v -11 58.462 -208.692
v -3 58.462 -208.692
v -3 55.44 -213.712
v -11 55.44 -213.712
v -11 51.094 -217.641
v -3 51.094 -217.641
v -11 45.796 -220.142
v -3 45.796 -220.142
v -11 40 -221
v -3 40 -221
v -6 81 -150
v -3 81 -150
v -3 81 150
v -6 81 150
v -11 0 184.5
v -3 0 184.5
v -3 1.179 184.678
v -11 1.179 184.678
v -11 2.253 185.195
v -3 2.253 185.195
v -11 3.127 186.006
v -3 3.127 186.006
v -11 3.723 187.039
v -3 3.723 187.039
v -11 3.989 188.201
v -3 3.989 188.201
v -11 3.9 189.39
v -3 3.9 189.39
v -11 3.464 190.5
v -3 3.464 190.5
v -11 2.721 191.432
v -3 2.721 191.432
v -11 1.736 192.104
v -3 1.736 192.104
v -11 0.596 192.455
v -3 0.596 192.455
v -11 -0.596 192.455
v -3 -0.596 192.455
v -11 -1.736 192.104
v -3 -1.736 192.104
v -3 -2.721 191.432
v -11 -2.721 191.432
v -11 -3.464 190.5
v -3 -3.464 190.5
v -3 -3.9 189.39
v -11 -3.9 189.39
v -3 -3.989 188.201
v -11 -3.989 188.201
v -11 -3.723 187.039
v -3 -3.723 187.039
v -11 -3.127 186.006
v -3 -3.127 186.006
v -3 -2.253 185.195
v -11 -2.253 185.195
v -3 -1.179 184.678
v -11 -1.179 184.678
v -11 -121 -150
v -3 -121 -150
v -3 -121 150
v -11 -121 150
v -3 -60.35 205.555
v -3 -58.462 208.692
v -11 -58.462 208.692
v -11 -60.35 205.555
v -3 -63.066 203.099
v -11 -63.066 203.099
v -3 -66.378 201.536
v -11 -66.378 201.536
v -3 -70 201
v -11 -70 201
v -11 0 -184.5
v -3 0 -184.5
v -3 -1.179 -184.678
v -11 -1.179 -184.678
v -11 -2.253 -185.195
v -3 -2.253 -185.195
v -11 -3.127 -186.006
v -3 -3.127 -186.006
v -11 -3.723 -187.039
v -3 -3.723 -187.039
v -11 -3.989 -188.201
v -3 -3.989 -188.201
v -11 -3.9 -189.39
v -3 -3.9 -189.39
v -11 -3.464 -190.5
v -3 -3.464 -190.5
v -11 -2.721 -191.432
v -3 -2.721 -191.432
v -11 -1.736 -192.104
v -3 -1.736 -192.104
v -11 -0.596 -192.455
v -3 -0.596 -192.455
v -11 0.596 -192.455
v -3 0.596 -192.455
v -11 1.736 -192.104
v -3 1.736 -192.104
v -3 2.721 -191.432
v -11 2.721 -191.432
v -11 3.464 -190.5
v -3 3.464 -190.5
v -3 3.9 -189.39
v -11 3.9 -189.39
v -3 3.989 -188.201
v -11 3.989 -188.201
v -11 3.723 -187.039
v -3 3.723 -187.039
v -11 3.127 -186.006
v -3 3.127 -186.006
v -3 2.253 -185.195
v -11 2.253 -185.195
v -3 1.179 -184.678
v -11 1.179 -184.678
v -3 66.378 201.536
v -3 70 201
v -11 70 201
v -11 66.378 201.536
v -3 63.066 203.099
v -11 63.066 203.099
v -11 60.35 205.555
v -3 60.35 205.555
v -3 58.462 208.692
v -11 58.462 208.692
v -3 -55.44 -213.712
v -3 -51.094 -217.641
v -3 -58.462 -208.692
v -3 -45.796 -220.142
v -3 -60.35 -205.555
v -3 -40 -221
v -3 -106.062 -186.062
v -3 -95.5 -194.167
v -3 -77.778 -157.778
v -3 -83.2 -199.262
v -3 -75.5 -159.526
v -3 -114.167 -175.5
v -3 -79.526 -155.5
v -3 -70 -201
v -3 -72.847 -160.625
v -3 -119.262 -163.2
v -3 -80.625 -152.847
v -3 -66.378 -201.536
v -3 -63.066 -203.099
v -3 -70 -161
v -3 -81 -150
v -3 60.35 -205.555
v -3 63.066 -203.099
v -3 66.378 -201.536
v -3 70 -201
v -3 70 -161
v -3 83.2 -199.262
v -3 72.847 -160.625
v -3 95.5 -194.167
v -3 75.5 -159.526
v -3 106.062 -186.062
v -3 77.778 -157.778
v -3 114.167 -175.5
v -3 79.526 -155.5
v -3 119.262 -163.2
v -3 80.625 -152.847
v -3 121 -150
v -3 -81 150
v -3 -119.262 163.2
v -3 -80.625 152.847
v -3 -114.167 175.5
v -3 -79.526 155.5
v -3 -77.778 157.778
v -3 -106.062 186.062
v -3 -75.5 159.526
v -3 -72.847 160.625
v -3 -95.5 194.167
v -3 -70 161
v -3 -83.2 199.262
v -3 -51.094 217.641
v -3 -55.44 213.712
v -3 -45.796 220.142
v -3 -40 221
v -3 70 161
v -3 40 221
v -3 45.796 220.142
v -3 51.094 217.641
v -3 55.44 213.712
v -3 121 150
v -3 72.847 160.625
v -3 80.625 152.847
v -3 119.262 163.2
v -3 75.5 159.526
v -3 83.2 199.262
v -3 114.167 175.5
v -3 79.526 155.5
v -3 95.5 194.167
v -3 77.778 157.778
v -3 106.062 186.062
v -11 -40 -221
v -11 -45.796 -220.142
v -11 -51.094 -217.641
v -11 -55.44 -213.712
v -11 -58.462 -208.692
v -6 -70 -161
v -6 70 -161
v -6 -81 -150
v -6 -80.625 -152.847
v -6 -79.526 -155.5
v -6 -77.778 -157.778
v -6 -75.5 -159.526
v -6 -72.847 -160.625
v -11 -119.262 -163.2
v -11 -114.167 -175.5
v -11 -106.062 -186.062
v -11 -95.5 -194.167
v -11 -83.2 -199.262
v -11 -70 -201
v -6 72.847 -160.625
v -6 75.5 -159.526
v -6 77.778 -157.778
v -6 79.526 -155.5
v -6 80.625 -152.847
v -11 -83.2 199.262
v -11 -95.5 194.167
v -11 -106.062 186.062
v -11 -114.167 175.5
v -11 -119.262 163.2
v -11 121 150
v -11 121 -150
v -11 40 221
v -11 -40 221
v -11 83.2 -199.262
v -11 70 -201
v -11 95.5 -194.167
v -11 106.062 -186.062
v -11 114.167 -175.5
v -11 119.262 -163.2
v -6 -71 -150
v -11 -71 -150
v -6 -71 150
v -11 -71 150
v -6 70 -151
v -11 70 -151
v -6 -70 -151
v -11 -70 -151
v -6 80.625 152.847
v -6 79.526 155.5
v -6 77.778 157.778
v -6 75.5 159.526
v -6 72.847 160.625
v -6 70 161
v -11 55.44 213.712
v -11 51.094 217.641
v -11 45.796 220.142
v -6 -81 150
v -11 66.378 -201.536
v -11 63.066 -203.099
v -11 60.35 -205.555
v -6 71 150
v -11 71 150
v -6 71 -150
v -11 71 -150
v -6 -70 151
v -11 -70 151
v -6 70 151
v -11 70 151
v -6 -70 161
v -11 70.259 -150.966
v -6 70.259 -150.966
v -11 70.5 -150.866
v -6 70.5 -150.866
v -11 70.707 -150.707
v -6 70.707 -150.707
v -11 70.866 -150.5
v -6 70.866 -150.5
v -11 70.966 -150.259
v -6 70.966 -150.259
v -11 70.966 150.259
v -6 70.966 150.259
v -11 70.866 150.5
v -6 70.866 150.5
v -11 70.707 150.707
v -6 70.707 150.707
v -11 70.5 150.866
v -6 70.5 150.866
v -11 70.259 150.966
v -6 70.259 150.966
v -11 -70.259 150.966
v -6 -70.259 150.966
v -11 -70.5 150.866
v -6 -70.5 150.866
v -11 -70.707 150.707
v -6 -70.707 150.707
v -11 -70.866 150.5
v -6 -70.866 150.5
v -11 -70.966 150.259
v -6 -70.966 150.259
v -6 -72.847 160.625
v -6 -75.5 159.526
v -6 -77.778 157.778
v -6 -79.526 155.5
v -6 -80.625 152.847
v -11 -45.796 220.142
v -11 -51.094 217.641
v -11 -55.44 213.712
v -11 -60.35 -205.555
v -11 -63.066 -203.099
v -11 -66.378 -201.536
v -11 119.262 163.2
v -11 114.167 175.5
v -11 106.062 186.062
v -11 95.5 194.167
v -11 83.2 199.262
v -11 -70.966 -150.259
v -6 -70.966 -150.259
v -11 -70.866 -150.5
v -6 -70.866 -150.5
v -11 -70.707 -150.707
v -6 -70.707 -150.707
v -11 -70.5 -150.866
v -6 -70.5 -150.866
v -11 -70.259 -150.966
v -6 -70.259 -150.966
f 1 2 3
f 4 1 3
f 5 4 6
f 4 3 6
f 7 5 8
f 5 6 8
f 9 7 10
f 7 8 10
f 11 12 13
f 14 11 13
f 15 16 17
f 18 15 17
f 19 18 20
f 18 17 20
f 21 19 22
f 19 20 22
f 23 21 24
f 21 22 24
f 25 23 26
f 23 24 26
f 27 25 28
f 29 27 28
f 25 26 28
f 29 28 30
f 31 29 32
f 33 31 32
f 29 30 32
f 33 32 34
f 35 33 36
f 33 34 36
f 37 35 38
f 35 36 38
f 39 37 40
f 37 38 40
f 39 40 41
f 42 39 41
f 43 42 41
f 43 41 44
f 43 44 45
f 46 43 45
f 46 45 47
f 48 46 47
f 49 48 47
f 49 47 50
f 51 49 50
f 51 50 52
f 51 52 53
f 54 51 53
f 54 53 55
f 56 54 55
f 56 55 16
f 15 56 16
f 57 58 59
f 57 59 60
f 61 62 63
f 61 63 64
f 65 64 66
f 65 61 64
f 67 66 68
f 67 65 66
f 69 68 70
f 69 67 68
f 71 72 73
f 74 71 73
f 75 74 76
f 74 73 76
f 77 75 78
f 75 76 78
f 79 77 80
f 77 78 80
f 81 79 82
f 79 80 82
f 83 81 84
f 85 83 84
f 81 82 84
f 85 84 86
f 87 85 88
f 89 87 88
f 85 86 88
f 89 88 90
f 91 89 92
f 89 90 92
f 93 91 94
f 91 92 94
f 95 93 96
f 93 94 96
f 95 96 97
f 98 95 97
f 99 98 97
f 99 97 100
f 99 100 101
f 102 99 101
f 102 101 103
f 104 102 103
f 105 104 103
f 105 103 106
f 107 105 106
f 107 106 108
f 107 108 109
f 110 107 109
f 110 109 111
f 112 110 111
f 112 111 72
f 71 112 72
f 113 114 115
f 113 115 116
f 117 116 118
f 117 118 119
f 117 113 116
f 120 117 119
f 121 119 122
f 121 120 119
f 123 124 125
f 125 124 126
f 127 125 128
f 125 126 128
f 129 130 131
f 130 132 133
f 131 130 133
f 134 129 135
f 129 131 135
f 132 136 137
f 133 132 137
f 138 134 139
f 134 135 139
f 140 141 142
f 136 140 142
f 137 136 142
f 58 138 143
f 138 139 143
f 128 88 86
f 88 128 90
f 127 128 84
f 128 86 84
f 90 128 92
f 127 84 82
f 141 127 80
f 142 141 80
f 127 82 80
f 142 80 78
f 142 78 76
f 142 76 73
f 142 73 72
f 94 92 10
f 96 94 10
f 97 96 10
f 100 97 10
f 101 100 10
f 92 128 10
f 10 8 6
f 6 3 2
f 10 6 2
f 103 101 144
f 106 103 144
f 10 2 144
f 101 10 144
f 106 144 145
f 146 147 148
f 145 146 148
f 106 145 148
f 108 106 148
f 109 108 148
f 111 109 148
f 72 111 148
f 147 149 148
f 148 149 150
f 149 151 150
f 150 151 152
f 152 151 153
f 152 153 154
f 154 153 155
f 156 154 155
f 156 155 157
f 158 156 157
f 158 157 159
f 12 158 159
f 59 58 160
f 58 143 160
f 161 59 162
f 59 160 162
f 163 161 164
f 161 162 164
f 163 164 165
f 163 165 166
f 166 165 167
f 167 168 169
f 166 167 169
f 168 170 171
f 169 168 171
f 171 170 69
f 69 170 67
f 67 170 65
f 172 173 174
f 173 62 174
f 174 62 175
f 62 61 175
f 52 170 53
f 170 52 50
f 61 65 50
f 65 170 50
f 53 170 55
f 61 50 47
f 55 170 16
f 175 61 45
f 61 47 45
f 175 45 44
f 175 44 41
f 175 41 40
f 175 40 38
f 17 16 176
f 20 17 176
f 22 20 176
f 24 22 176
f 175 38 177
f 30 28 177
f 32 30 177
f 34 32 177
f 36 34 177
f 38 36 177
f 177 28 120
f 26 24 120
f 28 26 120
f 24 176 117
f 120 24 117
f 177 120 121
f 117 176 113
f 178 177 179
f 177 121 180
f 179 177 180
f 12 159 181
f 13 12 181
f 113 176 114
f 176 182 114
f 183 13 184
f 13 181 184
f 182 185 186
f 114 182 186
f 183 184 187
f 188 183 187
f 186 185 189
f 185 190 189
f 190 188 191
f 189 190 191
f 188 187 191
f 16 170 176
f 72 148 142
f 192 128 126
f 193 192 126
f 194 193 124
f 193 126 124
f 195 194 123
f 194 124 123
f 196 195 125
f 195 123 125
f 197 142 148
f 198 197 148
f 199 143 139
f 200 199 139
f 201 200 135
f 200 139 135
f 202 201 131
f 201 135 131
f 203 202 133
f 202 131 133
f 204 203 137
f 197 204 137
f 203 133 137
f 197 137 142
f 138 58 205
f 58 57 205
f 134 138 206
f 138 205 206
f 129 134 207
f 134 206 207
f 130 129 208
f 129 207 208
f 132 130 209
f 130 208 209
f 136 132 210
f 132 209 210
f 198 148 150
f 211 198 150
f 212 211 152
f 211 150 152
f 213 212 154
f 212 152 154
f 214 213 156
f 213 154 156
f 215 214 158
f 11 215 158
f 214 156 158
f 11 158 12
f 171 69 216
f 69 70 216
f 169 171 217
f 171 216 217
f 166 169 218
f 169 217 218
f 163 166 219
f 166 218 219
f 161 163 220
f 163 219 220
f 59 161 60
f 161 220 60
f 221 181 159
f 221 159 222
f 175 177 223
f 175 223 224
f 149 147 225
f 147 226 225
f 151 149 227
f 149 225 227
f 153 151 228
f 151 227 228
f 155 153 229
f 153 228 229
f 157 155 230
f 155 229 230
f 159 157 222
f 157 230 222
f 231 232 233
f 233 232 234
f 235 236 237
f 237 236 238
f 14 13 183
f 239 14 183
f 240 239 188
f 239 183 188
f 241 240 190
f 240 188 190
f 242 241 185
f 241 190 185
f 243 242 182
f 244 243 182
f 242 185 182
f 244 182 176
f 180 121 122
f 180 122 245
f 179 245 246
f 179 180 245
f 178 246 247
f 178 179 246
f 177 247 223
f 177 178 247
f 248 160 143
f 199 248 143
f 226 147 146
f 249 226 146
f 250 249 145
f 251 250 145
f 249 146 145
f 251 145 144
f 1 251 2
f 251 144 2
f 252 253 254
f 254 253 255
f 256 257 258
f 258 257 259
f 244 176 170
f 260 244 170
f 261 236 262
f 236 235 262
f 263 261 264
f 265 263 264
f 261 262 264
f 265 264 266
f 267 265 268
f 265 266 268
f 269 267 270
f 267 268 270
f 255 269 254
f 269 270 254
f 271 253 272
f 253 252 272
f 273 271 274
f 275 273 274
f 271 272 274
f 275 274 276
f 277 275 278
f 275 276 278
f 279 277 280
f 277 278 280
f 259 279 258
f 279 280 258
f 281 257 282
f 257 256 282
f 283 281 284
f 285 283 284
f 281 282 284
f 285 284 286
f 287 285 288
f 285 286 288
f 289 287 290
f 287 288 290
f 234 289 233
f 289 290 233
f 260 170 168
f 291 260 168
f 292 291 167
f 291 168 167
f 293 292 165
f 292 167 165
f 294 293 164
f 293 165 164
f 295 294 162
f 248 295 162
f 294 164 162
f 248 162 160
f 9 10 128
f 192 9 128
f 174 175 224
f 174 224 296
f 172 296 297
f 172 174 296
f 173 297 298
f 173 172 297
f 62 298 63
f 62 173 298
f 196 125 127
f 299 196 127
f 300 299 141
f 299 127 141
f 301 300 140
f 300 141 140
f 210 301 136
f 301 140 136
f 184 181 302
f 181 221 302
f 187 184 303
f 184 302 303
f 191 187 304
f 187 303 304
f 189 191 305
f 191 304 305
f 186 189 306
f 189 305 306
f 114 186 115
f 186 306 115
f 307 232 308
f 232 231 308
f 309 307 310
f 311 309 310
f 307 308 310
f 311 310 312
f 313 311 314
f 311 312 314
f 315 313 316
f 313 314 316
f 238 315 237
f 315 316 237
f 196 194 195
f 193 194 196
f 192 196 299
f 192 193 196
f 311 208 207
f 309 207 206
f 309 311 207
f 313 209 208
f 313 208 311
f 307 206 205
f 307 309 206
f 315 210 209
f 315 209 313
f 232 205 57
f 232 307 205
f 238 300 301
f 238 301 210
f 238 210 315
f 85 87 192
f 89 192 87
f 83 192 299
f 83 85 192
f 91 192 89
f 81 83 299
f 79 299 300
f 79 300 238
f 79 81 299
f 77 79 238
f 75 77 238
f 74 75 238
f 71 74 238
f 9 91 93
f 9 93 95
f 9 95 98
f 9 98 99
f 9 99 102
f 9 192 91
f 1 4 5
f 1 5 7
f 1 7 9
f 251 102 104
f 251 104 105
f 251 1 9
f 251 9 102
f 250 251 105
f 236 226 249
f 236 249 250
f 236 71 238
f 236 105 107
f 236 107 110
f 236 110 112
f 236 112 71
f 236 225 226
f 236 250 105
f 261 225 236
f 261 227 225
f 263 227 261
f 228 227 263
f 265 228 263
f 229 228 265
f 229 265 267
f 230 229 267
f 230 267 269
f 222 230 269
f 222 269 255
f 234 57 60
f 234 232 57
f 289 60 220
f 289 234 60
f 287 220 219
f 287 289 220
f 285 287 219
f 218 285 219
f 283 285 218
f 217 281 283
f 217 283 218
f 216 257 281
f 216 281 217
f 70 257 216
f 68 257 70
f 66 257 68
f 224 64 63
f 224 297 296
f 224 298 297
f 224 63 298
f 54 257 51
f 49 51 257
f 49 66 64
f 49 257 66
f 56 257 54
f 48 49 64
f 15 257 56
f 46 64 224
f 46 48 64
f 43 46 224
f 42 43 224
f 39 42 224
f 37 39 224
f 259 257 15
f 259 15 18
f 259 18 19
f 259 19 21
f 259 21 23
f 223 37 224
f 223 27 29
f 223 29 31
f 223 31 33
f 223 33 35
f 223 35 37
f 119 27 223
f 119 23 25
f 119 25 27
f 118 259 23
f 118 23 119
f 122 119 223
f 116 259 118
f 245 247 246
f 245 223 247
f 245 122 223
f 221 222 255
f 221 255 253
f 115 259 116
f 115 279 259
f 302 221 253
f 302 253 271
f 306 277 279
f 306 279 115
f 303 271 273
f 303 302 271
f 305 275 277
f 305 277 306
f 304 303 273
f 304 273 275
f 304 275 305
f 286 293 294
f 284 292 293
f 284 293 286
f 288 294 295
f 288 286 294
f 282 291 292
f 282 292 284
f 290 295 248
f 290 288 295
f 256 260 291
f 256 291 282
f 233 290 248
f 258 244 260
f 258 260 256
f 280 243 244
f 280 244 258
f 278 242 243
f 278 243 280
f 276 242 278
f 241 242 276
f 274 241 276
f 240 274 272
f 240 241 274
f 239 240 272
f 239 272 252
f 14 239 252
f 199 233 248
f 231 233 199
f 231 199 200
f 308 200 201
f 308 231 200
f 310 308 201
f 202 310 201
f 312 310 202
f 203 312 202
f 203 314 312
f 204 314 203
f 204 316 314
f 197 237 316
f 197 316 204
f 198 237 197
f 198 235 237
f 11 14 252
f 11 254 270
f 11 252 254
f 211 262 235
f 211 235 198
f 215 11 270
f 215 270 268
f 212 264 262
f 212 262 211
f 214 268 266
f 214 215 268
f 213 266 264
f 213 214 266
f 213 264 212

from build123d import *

# Parameters (mm, degrees)
BOSS_EXTRUDE1_DEPTH = 8
CUT_EXTRUDE2_DEPTH  = 3
SKETCH3_R           = 4
CUT_EXTRUDE1_DEPTH  = 235.746671968
BOSS_EXTRUDE2_DEPTH = 8


with BuildPart() as part:
    # Sweep1: sweep along a path in Sketch2
    with BuildLine(Plane(origin=(0, 0, 0), x_dir=(0, 0, -1), z_dir=(1, 0, 0))) as sweep1_path:
        Line((150, 92), (-150, 92))
        ThreePointArc((-150, 92), (-165.556349186, 85.556349186), (-172, 70))
        Line((-172, 70), (-172, -70))
        ThreePointArc((-172, -70), (-165.556349186, -85.556349186), (-150, -92))
        Line((-150, -92), (150, -92))
        ThreePointArc((150, -92), (165.556349186, -85.556349186), (172, -70))
        Line((172, -70), (172, 70))
        ThreePointArc((172, 70), (165.556349186, 85.556349186), (150, 92))
    # Sketch1 → Sweep1 (sweep)
    with BuildSketch(Plane.XY):
        Polygon((-3, 121), (-3, 81), (-6, 81), (-6, 71), (-11, 71), (-11, 121), align=None)
    sweep(path=sweep1_path.line)

    # Sketch5 → Boss-Extrude1 (add)
    with BuildSketch(Plane.ZY.offset(11)):
        with BuildLine():
            Line((201, -70), (201, 70))
            ThreePointArc((201, 70), (186.062445841, 106.062445841), (150, 121))
            Line((150, 121), (-150, 121))
            ThreePointArc((-150, 121), (-186.062445841, 106.062445841), (-201, 70))
            Line((-201, 70), (-201, -70))
            ThreePointArc((-201, -70), (-186.062445841, -106.062445841), (-150, -121))
            Line((-150, -121), (150, -121))
            ThreePointArc((150, -121), (186.062445841, -106.062445841), (201, -70))
        make_face()
        with BuildLine():
            Line((0, 71), (-150, 71))
            ThreePointArc((-150, 71), (-150.707106781, 70.707106781), (-151, 70))
            Line((-151, 70), (-151, -70))
            ThreePointArc((-151, -70), (-150.707106781, -70.707106781), (-150, -71))
            Line((-150, -71), (150, -71))
            ThreePointArc((150, -71), (150.707106781, -70.707106781), (151, -70))
            Line((151, -70), (151, 70))
            ThreePointArc((151, 70), (150.707106781, 70.707106781), (150, 71))
            Line((150, 71), (0, 71))
        make_face(mode=Mode.SUBTRACT)
    extrude(amount=-BOSS_EXTRUDE1_DEPTH)

    # Sketch7 → Cut-Extrude2 (cut)
    with BuildSketch(Plane(origin=(-3, 0, 0), x_dir=(0, 0, -1), z_dir=(1, 0, 0))):
        with BuildLine():
            Line((161, -70), (161, 70))
            ThreePointArc((161, 70), (157.778174593, 77.778174593), (150, 81))
            Line((150, 81), (-150, 81))
            ThreePointArc((-150, 81), (-157.778174593, 77.778174593), (-161, 70))
            Line((-161, 70), (-161, -70))
            ThreePointArc((-161, -70), (-157.778174593, -77.778174593), (-150, -81))
            Line((-150, -81), (150, -81))
            ThreePointArc((150, -81), (157.778174593, -77.778174593), (161, -70))
        make_face()
    extrude(amount=-CUT_EXTRUDE2_DEPTH, mode=Mode.SUBTRACT)

    # Sketch3 → Cut-Extrude1 (cut, through all)
    with BuildSketch(Plane(origin=(-3, 0, 0), x_dir=(0, 0, -1), z_dir=(1, 0, 0))):
        with Locations((-188.5, 0)):
            Circle(SKETCH3_R)
        with Locations(Location((188.5, 0, 0), (0, 0, 180))):
            Circle(SKETCH3_R)
    extrude(amount=-CUT_EXTRUDE1_DEPTH, mode=Mode.SUBTRACT)

    # Sketch8 → Boss-Extrude2 (add)
    with BuildSketch(Plane(origin=(-3, 0, 0), x_dir=(0, 0, -1), z_dir=(1, 0, 0))):
        with BuildLine():
            Line((-201, -70), (-201, 70))
            ThreePointArc((-201, 70), (-203.099371321, 63.066247547), (-208.692307692, 58.461538462))
            ThreePointArc((-208.692307692, 58.461538462), (-217.641005887, 51.094003925), (-221, 40))
            Line((-221, 40), (-221, -40))
            ThreePointArc((-221, -40), (-217.641005887, -51.094003925), (-208.692307692, -58.461538462))
            ThreePointArc((-208.692307692, -58.461538462), (-203.099371321, -63.066247547), (-201, -70))
        make_face()
    boss_extrude2 = extrude(amount=-BOSS_EXTRUDE2_DEPTH)

    # Mirror1: Boss-Extrude2 across plane
    add(boss_extrude2.mirror(Plane.XY))


solid = part.part
